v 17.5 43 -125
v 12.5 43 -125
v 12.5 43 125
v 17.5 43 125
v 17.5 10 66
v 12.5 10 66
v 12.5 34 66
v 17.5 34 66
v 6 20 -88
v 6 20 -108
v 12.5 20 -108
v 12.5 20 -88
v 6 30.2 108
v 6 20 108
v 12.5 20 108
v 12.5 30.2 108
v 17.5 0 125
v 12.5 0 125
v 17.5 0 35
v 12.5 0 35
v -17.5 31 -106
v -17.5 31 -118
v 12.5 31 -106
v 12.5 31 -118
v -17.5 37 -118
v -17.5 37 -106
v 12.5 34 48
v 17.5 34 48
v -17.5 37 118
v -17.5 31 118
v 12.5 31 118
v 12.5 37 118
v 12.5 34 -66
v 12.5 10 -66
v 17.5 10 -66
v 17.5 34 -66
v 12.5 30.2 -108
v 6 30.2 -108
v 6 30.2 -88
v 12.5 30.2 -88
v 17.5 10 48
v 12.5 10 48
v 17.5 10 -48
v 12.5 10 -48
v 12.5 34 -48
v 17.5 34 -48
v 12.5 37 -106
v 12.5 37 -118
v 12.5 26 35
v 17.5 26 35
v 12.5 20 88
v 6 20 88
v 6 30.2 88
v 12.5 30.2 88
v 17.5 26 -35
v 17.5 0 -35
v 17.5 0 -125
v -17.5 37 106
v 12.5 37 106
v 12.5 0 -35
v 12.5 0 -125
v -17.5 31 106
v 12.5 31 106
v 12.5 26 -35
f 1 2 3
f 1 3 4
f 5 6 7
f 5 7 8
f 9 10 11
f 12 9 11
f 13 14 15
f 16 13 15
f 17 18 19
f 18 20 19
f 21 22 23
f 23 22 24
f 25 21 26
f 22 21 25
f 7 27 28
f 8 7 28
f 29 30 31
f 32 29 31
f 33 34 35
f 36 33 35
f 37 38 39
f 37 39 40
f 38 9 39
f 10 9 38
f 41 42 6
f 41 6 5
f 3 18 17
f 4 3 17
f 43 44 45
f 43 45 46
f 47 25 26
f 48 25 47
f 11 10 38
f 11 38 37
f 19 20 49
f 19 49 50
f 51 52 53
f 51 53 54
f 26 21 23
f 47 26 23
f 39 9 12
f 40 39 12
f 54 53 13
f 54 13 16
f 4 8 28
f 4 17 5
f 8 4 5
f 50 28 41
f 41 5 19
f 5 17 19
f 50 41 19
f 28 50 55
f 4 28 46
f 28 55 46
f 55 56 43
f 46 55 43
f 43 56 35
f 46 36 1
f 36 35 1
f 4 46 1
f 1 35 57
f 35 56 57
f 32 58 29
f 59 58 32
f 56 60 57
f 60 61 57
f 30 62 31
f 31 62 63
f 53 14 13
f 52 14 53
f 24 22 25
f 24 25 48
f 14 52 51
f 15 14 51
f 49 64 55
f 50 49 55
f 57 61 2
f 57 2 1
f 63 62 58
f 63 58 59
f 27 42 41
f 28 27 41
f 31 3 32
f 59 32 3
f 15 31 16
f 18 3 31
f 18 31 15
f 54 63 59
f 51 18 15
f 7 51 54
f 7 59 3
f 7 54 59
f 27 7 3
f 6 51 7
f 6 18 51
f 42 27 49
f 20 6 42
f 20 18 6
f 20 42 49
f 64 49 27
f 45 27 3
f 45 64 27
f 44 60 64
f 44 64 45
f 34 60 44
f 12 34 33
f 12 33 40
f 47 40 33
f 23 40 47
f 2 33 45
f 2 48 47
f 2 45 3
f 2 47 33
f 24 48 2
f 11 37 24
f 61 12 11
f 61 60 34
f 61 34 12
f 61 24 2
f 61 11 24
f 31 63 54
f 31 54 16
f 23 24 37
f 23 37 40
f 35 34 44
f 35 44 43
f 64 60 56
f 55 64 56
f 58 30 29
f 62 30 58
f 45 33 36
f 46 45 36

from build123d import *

# Parameters (mm, degrees)
SK_P01_BUMPERFACE_W      = 5
SK_P01_BUMPERFACE_H      = 13
P01_BUMPERFACE_DEPTH     = 43
SK_P02_BUMPERFACE_W      = 5
SK_P02_BUMPERFACE_H      = 59
P02_BUMPERFACE_DEPTH     = 43
SK_P03_BUMPERFACE_W      = 5
SK_P03_BUMPERFACE_H      = 18
P03_BUMPERFACE_DEPTH     = 10
P04_BUMPERFACE_START     = 34
SK_P04_BUMPERFACE_W      = 5
SK_P04_BUMPERFACE_H      = 18
P04_BUMPERFACE_DEPTH     = 9
P05_FLEXUREBRACKET_START = 31
SK_P05_FLEXUREBRACKET_W  = 30
SK_P05_FLEXUREBRACKET_H  = 12
P05_FLEXUREBRACKET_DEPTH = 6
P06_SWITCHSS5GL2_START   = 20
SK_P06_SWITCHSS5GL2_W    = 6.5
SK_P06_SWITCHSS5GL2_H    = 20
P06_SWITCHSS5GL2_DEPTH   = 10.2
SK_P07_BUMPERFACE_W      = 5
SK_P07_BUMPERFACE_H      = 13
P07_BUMPERFACE_DEPTH     = 43
SK_P08_BUMPERFACE_W      = 5
SK_P08_BUMPERFACE_H      = 59
P08_BUMPERFACE_DEPTH     = 43
SK_P09_BUMPERFACE_W      = 5
SK_P09_BUMPERFACE_H      = 18
P09_BUMPERFACE_DEPTH     = 10
P10_BUMPERFACE_START     = 34
SK_P10_BUMPERFACE_W      = 5
SK_P10_BUMPERFACE_H      = 18
P10_BUMPERFACE_DEPTH     = 9
P11_FLEXUREBRACKET_START = 31
SK_P11_FLEXUREBRACKET_W  = 30
SK_P11_FLEXUREBRACKET_H  = 12
P11_FLEXUREBRACKET_DEPTH = 6
P12_SWITCHSS5GL2_START   = 20
SK_P12_SWITCHSS5GL2_W    = 6.5
SK_P12_SWITCHSS5GL2_H    = 20
P12_SWITCHSS5GL2_DEPTH   = 10.2
P13_BUMPERFACE_START     = 26
SK_P13_BUMPERFACE_W      = 5
SK_P13_BUMPERFACE_H      = 70
P13_BUMPERFACE_DEPTH     = 17


with BuildPart() as part:
    # SK_P01_Bumperface → P01_Bumperface (new body)
    with BuildSketch(Plane(origin=(0, 0, 0), x_dir=(1, 0, 0), z_dir=(0, 1, 0))):
        with Locations((15, -41.5)):
            Rectangle(SK_P01_BUMPERFACE_W, SK_P01_BUMPERFACE_H)
    extrude(amount=P01_BUMPERFACE_DEPTH)



with BuildPart() as body_2:
    # SK_P02_Bumperface → P02_Bumperface (new body)
    with BuildSketch(Plane(origin=(0, 0, 0), x_dir=(1, 0, 0), z_dir=(0, 1, 0))):
        with Locations((15, -95.5)):
            Rectangle(SK_P02_BUMPERFACE_W, SK_P02_BUMPERFACE_H)
    extrude(amount=P02_BUMPERFACE_DEPTH)


with BuildPart() as part_1:
    add(part.part)

    add(body_2.part)  # P03_Bumperface merges body 2
    # SK_P03_Bumperface → P03_Bumperface (add)
    with BuildSketch(Plane(origin=(0, 0, 0), x_dir=(1, 0, 0), z_dir=(0, 1, 0))):
        with Locations((15, -57)):
            Rectangle(SK_P03_BUMPERFACE_W, SK_P03_BUMPERFACE_H)
    extrude(amount=P03_BUMPERFACE_DEPTH)

    # SK_P04_Bumperface → P04_Bumperface (add)
    with BuildSketch(Plane(origin=(0, 0, 0), x_dir=(1, 0, 0), z_dir=(0, 1, 0)).offset(P04_BUMPERFACE_START)):
        with Locations((15, -57)):
            Rectangle(SK_P04_BUMPERFACE_W, SK_P04_BUMPERFACE_H)
    extrude(amount=P04_BUMPERFACE_DEPTH)

    # SK_P05_Flexurebracket → P05_Flexurebracket (add)
    with BuildSketch(Plane(origin=(0, 0, 0), x_dir=(1, 0, 0), z_dir=(0, 1, 0)).offset(P05_FLEXUREBRACKET_START)):
        with Locations((-2.5, -112)):
            Rectangle(SK_P05_FLEXUREBRACKET_W, SK_P05_FLEXUREBRACKET_H)
    extrude(amount=P05_FLEXUREBRACKET_DEPTH)

    # SK_P06_SwitchSS5GL2 → P06_SwitchSS5GL2 (add)
    with BuildSketch(Plane(origin=(0, 0, 0), x_dir=(1, 0, 0), z_dir=(0, 1, 0)).offset(P06_SWITCHSS5GL2_START)):
        with Locations((9.25, -98)):
            Rectangle(SK_P06_SWITCHSS5GL2_W, SK_P06_SWITCHSS5GL2_H)
    extrude(amount=P06_SWITCHSS5GL2_DEPTH)



with BuildPart() as body_2_2:
    # SK_P07_Bumperface → P07_Bumperface (new body)
    with BuildSketch(Plane(origin=(0, 0, 0), x_dir=(1, 0, 0), z_dir=(0, 1, 0))):
        with Locations((15, 41.5)):
            Rectangle(SK_P07_BUMPERFACE_W, SK_P07_BUMPERFACE_H)
    extrude(amount=P07_BUMPERFACE_DEPTH)



with BuildPart() as body_3:
    # SK_P08_Bumperface → P08_Bumperface (new body)
    with BuildSketch(Plane(origin=(0, 0, 0), x_dir=(1, 0, 0), z_dir=(0, 1, 0))):
        with Locations((15, 95.5)):
            Rectangle(SK_P08_BUMPERFACE_W, SK_P08_BUMPERFACE_H)
    extrude(amount=P08_BUMPERFACE_DEPTH)


with BuildPart() as body_2_2_1:
    add(body_2_2.part)

    add(body_3.part)  # P09_Bumperface merges body 3
    # SK_P09_Bumperface → P09_Bumperface (add)
    with BuildSketch(Plane(origin=(0, 0, 0), x_dir=(1, 0, 0), z_dir=(0, 1, 0))):
        with Locations((15, 57)):
            Rectangle(SK_P09_BUMPERFACE_W, SK_P09_BUMPERFACE_H)
    extrude(amount=P09_BUMPERFACE_DEPTH)

    # SK_P10_Bumperface → P10_Bumperface (add)
    with BuildSketch(Plane(origin=(0, 0, 0), x_dir=(1, 0, 0), z_dir=(0, 1, 0)).offset(P10_BUMPERFACE_START)):
        with Locations((15, 57)):
            Rectangle(SK_P10_BUMPERFACE_W, SK_P10_BUMPERFACE_H)
    extrude(amount=P10_BUMPERFACE_DEPTH)

    # SK_P11_Flexurebracket → P11_Flexurebracket (add)
    with BuildSketch(Plane(origin=(0, 0, 0), x_dir=(1, 0, 0), z_dir=(0, 1, 0)).offset(P11_FLEXUREBRACKET_START)):
        with Locations((-2.5, 112)):
            Rectangle(SK_P11_FLEXUREBRACKET_W, SK_P11_FLEXUREBRACKET_H)
    extrude(amount=P11_FLEXUREBRACKET_DEPTH)

    # SK_P12_SwitchSS5GL2 → P12_SwitchSS5GL2 (add)
    with BuildSketch(Plane(origin=(0, 0, 0), x_dir=(1, 0, 0), z_dir=(0, 1, 0)).offset(P12_SWITCHSS5GL2_START)):
        with Locations((9.25, 98)):
            Rectangle(SK_P12_SWITCHSS5GL2_W, SK_P12_SWITCHSS5GL2_H)
    extrude(amount=P12_SWITCHSS5GL2_DEPTH)


with BuildPart() as part_2:
    add(part_1.part)

    add(body_2_2_1.part)  # P13_Bumperface merges body 2 2
    # SK_P13_Bumperface → P13_Bumperface (add)
    with BuildSketch(Plane(origin=(0, 0, 0), x_dir=(1, 0, 0), z_dir=(0, 1, 0)).offset(P13_BUMPERFACE_START)):
        with Locations((15, 0)):
            Rectangle(SK_P13_BUMPERFACE_W, SK_P13_BUMPERFACE_H)
    extrude(amount=P13_BUMPERFACE_DEPTH)


solid = part_2.part
